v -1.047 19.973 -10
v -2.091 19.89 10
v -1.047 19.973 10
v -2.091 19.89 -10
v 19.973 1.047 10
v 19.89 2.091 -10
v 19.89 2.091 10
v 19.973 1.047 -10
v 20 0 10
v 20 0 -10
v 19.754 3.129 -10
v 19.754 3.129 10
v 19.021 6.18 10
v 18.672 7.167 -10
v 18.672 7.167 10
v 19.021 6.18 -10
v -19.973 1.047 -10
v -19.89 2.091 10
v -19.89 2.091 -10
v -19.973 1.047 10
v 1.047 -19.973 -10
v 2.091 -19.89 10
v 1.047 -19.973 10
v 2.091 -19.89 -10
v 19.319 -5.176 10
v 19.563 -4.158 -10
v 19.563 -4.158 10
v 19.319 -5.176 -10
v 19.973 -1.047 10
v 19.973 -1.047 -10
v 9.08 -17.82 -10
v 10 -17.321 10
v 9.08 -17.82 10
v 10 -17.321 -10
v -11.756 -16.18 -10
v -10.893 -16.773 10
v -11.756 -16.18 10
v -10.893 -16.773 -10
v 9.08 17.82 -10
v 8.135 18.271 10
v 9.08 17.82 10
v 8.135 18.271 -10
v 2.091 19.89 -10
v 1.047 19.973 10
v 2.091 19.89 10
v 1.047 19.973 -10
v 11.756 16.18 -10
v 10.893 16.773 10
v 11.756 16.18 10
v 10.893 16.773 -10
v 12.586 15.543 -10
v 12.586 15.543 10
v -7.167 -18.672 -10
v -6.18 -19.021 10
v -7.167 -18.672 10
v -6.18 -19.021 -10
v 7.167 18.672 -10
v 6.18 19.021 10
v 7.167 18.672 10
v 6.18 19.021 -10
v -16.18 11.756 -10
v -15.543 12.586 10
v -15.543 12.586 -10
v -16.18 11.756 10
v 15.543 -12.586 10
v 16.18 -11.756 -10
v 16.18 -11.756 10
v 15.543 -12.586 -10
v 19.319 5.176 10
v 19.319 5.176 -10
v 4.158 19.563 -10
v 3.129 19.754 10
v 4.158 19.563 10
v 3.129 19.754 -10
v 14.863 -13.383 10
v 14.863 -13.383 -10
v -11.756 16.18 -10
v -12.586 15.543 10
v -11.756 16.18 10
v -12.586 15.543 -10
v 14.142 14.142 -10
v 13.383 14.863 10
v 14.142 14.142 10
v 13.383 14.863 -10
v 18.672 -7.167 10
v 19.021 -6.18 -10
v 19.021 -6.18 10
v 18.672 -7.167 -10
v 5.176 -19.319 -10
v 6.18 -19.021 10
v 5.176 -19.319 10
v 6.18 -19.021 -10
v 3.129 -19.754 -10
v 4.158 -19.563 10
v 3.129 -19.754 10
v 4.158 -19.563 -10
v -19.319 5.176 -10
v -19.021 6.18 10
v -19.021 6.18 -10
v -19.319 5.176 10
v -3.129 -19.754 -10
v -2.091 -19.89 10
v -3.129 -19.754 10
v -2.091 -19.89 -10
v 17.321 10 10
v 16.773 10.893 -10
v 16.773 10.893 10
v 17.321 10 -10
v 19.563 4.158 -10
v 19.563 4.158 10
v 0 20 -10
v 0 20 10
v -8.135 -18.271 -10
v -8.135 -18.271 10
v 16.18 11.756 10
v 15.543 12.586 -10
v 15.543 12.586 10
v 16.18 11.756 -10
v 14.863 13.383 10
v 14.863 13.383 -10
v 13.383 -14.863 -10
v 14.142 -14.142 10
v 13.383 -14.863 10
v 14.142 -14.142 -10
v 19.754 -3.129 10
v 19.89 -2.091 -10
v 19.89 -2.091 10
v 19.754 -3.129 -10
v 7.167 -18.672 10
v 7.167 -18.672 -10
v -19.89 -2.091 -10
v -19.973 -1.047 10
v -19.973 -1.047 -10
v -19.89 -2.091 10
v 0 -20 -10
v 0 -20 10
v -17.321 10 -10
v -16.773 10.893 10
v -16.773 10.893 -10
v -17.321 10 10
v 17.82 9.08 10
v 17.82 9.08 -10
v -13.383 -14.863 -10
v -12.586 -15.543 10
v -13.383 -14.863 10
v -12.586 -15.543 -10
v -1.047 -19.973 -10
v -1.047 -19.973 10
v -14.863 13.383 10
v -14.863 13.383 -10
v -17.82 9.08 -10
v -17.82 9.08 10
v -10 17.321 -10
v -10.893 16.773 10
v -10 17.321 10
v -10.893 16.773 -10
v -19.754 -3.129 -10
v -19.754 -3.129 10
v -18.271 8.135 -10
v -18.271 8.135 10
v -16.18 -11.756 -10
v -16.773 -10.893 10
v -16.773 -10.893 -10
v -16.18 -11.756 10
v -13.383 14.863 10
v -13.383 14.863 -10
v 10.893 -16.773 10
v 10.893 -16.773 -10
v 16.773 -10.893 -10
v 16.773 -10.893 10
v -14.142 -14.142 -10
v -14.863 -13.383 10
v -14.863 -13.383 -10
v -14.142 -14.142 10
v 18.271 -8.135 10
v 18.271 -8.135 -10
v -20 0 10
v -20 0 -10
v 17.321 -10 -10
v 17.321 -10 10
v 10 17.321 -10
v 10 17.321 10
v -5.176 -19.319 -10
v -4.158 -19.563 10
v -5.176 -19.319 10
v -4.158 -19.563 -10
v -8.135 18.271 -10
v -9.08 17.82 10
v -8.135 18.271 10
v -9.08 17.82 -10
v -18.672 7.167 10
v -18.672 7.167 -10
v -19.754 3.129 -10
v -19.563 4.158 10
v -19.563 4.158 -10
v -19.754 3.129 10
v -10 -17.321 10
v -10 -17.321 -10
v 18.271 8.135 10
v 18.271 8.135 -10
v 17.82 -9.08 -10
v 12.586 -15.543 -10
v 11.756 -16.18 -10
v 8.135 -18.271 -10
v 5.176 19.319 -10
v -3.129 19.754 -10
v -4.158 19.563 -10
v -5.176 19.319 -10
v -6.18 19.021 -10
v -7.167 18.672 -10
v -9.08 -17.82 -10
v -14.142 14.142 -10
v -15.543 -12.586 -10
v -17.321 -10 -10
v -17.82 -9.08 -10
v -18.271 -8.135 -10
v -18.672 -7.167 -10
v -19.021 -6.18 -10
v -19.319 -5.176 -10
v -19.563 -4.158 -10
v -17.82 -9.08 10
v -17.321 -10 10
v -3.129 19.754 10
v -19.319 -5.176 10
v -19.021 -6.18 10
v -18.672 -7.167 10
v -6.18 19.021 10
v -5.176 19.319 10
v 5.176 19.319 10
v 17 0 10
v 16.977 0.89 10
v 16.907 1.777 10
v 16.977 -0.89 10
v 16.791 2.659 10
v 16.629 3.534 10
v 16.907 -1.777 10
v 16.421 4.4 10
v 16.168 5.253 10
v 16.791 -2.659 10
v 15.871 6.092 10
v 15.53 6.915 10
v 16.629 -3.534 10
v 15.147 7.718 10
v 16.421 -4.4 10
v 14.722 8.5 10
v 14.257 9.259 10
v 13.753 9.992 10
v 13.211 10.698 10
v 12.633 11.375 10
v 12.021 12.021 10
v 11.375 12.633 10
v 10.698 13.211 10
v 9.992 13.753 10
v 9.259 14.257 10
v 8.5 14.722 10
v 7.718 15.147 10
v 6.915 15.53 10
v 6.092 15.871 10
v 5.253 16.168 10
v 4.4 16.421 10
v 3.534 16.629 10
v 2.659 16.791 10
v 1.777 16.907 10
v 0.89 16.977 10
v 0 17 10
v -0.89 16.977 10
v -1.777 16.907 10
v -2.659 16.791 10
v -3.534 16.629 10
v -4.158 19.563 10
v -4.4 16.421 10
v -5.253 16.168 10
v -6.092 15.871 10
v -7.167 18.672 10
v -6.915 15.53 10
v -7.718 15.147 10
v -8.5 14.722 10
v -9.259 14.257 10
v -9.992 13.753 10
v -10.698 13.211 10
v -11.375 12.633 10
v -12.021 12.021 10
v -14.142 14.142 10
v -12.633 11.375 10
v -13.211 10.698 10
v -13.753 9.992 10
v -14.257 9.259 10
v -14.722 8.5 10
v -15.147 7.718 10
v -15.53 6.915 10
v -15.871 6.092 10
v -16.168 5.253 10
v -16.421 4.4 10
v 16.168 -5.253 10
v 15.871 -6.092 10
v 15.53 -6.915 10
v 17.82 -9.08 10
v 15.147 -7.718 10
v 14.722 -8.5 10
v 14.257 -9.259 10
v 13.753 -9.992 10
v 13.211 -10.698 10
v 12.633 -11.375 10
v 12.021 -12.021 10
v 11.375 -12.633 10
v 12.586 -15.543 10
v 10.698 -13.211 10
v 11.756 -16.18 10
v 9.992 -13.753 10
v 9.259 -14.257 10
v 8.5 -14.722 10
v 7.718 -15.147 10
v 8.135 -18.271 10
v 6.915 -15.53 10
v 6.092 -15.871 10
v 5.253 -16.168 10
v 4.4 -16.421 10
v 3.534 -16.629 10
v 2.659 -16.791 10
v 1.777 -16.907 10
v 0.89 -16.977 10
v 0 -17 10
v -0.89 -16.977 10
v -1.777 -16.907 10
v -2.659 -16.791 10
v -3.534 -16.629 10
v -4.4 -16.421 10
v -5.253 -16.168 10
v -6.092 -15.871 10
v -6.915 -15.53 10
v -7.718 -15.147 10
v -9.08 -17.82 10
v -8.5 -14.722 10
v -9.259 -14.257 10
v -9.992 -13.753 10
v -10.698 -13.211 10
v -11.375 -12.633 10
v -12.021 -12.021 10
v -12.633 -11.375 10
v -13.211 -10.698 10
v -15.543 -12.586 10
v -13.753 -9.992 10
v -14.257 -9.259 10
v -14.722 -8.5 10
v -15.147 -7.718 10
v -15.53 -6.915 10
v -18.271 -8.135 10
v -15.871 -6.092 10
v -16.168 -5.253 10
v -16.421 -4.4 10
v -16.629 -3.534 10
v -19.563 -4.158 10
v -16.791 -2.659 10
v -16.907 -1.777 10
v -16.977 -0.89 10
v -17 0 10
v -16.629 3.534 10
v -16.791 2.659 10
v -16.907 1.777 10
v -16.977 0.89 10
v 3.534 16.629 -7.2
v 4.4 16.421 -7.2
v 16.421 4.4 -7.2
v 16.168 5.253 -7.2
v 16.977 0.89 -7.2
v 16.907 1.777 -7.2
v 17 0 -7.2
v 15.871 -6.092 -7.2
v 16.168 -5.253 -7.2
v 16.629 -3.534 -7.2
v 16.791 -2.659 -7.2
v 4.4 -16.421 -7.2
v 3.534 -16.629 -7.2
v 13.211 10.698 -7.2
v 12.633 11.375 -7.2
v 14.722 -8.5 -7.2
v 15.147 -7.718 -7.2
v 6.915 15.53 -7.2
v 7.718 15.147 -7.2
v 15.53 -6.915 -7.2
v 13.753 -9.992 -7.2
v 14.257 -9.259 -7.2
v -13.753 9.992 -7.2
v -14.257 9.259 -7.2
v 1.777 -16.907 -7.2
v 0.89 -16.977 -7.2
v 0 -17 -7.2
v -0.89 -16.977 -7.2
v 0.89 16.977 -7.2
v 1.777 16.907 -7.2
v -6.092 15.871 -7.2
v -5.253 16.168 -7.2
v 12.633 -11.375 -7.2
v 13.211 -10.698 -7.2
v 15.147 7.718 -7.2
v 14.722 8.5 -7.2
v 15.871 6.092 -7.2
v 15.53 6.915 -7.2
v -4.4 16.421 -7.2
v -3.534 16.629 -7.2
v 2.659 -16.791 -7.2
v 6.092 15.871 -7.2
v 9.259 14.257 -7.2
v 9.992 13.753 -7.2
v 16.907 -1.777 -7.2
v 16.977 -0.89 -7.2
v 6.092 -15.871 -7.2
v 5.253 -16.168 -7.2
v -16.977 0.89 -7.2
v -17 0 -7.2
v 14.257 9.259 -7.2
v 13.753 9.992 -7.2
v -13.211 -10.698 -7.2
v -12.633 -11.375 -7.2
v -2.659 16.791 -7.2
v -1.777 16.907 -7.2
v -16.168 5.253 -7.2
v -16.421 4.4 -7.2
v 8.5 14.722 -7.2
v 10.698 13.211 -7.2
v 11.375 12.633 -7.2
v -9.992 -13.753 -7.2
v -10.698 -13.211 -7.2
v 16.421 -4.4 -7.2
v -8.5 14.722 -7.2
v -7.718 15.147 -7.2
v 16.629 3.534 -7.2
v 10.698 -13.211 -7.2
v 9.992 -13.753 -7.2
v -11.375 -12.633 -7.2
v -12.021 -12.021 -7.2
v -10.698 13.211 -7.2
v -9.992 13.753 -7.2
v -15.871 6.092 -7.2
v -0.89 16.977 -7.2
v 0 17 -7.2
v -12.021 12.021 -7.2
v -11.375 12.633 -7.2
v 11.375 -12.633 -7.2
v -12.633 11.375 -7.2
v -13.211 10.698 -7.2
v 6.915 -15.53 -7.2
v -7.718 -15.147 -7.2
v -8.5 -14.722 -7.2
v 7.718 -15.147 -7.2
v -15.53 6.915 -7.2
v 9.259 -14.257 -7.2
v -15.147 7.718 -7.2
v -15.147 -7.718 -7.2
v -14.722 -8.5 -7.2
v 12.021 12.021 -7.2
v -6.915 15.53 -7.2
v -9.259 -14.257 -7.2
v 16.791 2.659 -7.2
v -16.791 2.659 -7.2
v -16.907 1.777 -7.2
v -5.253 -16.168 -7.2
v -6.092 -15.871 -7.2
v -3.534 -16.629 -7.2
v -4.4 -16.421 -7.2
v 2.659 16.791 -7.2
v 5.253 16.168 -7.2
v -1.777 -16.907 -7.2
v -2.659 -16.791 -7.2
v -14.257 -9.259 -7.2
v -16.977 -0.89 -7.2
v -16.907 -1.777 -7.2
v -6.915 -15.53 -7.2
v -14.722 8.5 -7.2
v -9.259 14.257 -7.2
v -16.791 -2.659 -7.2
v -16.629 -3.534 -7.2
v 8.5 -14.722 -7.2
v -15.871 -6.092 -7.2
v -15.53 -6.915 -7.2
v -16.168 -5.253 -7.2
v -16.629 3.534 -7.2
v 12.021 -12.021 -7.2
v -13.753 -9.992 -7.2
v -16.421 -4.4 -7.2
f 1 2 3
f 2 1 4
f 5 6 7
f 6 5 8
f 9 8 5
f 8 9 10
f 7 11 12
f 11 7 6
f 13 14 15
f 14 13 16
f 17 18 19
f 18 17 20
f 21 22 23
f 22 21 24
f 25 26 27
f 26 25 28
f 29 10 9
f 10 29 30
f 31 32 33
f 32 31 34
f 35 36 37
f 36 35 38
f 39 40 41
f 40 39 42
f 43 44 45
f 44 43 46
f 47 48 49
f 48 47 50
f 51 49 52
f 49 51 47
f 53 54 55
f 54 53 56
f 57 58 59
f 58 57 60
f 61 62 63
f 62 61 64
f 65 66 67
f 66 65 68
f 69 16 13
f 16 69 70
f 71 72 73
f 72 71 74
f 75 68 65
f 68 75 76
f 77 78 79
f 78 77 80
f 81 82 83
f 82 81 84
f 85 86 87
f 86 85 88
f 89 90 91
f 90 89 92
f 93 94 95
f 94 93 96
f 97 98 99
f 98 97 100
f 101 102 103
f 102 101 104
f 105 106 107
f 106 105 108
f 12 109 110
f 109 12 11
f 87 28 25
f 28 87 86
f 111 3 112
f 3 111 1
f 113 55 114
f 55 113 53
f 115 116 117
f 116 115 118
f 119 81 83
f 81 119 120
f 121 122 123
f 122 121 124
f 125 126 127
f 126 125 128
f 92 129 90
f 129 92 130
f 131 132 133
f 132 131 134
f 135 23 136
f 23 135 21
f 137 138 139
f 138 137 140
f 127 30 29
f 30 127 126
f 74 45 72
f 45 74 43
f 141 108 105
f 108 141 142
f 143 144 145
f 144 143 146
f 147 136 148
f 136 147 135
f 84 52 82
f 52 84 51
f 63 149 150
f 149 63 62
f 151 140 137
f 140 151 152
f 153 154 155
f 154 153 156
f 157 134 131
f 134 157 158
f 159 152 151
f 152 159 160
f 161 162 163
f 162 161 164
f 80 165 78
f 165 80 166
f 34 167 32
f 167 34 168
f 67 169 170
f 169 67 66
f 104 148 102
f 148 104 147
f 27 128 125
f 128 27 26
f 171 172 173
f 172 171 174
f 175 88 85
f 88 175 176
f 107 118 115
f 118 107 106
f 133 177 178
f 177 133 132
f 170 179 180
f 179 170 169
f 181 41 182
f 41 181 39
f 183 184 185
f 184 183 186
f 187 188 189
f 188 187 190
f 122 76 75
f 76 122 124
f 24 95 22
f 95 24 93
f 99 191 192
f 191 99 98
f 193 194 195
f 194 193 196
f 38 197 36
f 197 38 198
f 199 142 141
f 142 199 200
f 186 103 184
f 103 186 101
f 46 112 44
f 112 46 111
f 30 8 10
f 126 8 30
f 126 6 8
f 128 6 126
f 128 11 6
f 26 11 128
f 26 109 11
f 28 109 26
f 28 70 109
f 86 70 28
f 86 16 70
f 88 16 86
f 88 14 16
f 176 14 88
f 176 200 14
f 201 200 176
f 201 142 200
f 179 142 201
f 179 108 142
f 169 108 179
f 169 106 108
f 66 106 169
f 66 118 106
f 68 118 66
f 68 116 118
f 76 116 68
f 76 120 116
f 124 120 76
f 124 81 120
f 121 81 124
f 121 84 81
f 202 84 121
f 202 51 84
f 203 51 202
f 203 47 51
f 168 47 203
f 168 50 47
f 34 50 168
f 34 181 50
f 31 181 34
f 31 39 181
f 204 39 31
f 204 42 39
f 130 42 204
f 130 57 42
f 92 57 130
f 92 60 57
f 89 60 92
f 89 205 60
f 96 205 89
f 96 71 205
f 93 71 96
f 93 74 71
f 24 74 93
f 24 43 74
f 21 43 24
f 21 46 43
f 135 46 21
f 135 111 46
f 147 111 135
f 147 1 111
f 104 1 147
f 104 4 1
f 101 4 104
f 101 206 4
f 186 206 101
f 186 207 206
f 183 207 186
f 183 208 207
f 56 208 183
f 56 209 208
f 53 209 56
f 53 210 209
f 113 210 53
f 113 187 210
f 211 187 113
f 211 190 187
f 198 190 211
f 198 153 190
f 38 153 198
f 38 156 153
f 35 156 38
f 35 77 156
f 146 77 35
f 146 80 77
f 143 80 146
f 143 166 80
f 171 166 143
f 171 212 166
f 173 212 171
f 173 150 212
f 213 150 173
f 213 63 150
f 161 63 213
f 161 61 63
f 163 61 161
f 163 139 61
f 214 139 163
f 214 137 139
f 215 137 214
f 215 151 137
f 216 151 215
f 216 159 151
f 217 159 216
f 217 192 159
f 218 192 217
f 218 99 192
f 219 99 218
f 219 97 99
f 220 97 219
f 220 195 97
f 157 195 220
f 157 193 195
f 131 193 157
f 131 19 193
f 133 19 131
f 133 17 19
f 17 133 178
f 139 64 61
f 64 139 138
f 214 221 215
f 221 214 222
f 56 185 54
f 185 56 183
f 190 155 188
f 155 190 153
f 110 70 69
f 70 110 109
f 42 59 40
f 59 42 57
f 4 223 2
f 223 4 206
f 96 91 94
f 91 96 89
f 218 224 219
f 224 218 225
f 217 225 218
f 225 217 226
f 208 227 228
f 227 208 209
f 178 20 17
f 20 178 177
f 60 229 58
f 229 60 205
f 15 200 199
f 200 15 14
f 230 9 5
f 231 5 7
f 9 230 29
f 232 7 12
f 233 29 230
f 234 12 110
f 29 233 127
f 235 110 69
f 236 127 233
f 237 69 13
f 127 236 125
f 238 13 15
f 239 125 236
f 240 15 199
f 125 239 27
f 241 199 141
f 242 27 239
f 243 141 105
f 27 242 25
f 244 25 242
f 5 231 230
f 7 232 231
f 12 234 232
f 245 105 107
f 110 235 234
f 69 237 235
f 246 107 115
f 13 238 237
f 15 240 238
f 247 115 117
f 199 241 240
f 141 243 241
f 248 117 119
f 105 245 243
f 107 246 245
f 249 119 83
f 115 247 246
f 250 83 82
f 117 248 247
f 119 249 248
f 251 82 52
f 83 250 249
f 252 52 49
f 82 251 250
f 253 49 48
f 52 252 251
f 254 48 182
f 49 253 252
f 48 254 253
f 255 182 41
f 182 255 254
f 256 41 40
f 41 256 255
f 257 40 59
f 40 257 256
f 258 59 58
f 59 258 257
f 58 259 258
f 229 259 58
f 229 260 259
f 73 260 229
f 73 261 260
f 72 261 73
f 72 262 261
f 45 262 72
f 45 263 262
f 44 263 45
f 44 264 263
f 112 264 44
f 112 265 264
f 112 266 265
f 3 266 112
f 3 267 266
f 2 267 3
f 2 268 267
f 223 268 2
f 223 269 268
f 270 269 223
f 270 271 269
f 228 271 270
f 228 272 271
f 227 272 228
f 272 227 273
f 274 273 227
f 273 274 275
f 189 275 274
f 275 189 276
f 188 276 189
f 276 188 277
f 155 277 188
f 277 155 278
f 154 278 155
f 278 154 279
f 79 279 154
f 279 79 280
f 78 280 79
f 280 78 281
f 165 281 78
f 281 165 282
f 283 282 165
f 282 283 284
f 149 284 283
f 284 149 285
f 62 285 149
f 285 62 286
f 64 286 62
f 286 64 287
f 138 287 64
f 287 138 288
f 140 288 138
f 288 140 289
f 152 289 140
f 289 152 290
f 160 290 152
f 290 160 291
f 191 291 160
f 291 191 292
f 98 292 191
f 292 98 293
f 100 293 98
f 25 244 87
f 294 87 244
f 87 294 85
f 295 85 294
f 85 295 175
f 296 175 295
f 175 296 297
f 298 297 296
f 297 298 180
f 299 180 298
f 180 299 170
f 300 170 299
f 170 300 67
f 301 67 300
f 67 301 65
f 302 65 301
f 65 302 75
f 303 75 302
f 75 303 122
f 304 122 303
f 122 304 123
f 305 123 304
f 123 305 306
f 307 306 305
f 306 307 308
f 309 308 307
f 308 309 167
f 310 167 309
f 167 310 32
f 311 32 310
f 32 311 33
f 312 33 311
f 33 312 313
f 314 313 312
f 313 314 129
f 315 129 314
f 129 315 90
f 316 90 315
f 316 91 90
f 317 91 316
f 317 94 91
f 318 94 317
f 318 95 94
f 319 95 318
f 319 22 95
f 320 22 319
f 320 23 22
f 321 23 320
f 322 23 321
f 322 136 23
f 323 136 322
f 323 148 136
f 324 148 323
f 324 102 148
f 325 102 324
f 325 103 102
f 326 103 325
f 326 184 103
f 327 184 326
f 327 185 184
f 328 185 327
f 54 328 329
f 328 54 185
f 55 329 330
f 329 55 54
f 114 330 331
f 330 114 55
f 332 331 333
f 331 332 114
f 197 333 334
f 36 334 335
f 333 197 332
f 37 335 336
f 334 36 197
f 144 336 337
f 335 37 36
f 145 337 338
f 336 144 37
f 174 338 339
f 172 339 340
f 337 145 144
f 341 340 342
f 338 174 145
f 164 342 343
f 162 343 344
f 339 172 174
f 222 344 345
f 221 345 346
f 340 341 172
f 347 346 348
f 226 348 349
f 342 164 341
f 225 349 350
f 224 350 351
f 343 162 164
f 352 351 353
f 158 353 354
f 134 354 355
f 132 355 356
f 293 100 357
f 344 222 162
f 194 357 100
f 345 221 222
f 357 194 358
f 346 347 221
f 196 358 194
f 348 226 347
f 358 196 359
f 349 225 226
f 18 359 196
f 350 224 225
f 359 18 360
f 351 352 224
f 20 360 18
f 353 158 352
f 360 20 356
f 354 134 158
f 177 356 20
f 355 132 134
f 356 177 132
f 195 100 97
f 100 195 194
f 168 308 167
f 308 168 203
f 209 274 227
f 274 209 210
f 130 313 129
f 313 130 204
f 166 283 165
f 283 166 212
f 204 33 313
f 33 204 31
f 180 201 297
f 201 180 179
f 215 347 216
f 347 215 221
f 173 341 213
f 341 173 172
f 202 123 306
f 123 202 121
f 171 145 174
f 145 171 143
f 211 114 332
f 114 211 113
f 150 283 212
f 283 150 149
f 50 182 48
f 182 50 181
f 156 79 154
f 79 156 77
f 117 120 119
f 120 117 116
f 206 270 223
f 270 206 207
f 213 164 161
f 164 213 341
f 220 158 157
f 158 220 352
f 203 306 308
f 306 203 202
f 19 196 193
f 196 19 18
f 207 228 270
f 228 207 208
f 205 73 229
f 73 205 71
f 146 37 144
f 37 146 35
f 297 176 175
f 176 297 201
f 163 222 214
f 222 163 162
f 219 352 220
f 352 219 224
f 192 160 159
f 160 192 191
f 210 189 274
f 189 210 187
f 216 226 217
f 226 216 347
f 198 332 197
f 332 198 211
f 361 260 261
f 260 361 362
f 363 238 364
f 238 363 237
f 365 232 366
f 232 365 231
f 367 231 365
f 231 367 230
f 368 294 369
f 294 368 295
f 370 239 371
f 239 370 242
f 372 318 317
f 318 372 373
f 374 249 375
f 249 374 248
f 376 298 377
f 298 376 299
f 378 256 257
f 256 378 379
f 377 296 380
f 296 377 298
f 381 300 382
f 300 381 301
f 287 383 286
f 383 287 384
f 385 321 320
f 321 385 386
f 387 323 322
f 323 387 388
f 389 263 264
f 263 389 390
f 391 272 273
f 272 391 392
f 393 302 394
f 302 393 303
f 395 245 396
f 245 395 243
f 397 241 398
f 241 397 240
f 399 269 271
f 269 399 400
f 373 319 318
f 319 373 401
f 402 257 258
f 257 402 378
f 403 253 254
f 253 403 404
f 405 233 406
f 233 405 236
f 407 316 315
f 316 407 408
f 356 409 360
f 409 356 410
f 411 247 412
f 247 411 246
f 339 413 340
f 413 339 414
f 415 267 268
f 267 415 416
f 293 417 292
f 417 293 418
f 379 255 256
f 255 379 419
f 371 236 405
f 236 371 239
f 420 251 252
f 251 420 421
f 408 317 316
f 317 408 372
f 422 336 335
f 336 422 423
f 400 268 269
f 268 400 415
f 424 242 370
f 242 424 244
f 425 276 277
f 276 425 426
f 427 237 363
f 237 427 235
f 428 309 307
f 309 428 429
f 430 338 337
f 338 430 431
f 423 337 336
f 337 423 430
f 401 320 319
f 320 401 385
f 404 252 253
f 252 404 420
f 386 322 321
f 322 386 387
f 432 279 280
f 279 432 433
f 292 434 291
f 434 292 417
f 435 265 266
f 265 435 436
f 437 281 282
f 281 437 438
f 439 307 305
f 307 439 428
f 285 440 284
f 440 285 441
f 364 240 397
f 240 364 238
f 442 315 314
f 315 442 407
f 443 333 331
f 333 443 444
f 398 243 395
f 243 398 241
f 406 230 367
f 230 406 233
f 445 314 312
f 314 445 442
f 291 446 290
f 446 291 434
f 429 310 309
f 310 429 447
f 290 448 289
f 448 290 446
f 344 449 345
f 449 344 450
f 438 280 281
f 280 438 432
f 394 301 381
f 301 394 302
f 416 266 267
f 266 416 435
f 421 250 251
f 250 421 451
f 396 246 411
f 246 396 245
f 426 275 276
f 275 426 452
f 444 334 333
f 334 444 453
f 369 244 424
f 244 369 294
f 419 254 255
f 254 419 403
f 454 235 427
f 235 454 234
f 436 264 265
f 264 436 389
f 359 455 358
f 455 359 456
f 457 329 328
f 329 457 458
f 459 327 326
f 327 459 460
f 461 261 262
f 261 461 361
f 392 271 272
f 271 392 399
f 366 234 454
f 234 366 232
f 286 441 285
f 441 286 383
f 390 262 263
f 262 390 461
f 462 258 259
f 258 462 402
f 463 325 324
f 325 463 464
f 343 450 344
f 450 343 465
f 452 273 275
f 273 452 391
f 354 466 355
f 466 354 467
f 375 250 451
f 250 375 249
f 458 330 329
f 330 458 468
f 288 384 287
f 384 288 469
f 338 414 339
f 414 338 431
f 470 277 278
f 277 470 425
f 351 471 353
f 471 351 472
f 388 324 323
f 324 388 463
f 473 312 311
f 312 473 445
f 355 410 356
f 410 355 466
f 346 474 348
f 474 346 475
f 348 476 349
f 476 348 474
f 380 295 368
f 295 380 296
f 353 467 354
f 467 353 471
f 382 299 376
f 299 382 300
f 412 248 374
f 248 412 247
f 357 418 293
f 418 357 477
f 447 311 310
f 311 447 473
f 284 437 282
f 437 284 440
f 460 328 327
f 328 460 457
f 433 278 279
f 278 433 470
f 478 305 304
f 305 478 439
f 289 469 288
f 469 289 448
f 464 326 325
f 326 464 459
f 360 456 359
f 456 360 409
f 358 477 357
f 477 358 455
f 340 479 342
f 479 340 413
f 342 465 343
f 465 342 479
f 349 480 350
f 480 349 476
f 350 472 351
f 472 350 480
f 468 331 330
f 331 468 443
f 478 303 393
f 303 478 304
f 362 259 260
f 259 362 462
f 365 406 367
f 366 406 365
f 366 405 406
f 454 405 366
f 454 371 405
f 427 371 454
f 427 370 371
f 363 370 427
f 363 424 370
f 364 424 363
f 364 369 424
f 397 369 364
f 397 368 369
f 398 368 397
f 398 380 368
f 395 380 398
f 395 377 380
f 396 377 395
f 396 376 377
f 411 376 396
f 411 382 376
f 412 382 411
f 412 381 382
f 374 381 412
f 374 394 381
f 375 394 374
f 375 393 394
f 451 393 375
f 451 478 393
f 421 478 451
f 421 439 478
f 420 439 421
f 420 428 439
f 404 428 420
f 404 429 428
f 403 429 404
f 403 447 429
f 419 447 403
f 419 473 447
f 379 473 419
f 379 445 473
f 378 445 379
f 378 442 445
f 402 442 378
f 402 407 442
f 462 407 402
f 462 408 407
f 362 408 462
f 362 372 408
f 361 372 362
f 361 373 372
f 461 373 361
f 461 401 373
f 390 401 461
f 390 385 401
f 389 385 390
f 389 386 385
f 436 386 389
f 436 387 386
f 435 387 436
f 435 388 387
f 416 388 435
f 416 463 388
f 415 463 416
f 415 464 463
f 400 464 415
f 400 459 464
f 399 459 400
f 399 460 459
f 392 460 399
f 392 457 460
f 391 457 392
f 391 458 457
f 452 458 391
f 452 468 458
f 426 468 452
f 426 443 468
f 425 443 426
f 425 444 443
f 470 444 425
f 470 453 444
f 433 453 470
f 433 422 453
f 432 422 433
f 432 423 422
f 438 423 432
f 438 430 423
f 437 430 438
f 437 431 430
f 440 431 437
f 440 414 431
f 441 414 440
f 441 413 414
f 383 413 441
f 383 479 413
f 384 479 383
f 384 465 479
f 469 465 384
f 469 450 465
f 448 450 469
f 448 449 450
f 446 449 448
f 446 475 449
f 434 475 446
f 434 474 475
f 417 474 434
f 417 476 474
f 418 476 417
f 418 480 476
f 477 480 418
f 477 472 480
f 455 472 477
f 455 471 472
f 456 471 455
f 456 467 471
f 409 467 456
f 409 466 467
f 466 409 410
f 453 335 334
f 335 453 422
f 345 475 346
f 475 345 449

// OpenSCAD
// HT 40 cap (end cap) - one connected solid

$fn = 120;

// Parameters
wall_thickness = 3;                 // radial wall thickness
ht_pipe_outer_diameter = 40;        // cap outside diameter
cap_length = 20;                    // total cap height
bottom_thickness = 3;               // closed-end thickness

// Derived
ht_pipe_inner_diameter = ht_pipe_outer_diameter - 2 * wall_thickness;
inner_h = cap_length - bottom_thickness;
eps = 0.2;

module ht_40_cap() {
    // Build centered to avoid view/camera issues and ensure robust boolean
    difference() {
        // Outer body
        cylinder(h = cap_length, d = ht_pipe_outer_diameter, center = true);

        // Inner socket void (leaves a closed end of bottom_thickness)
        // Outer spans z: [-cap_length/2, +cap_length/2]
        // Inner spans z: [-cap_length/2 + bottom_thickness, +cap_length/2]
        translate([0, 0, (-cap_length/2 + bottom_thickness) + inner_h/2])
            cylinder(h = inner_h + 2*eps, d = ht_pipe_inner_diameter, center = true);
    }
}

ht_40_cap();
